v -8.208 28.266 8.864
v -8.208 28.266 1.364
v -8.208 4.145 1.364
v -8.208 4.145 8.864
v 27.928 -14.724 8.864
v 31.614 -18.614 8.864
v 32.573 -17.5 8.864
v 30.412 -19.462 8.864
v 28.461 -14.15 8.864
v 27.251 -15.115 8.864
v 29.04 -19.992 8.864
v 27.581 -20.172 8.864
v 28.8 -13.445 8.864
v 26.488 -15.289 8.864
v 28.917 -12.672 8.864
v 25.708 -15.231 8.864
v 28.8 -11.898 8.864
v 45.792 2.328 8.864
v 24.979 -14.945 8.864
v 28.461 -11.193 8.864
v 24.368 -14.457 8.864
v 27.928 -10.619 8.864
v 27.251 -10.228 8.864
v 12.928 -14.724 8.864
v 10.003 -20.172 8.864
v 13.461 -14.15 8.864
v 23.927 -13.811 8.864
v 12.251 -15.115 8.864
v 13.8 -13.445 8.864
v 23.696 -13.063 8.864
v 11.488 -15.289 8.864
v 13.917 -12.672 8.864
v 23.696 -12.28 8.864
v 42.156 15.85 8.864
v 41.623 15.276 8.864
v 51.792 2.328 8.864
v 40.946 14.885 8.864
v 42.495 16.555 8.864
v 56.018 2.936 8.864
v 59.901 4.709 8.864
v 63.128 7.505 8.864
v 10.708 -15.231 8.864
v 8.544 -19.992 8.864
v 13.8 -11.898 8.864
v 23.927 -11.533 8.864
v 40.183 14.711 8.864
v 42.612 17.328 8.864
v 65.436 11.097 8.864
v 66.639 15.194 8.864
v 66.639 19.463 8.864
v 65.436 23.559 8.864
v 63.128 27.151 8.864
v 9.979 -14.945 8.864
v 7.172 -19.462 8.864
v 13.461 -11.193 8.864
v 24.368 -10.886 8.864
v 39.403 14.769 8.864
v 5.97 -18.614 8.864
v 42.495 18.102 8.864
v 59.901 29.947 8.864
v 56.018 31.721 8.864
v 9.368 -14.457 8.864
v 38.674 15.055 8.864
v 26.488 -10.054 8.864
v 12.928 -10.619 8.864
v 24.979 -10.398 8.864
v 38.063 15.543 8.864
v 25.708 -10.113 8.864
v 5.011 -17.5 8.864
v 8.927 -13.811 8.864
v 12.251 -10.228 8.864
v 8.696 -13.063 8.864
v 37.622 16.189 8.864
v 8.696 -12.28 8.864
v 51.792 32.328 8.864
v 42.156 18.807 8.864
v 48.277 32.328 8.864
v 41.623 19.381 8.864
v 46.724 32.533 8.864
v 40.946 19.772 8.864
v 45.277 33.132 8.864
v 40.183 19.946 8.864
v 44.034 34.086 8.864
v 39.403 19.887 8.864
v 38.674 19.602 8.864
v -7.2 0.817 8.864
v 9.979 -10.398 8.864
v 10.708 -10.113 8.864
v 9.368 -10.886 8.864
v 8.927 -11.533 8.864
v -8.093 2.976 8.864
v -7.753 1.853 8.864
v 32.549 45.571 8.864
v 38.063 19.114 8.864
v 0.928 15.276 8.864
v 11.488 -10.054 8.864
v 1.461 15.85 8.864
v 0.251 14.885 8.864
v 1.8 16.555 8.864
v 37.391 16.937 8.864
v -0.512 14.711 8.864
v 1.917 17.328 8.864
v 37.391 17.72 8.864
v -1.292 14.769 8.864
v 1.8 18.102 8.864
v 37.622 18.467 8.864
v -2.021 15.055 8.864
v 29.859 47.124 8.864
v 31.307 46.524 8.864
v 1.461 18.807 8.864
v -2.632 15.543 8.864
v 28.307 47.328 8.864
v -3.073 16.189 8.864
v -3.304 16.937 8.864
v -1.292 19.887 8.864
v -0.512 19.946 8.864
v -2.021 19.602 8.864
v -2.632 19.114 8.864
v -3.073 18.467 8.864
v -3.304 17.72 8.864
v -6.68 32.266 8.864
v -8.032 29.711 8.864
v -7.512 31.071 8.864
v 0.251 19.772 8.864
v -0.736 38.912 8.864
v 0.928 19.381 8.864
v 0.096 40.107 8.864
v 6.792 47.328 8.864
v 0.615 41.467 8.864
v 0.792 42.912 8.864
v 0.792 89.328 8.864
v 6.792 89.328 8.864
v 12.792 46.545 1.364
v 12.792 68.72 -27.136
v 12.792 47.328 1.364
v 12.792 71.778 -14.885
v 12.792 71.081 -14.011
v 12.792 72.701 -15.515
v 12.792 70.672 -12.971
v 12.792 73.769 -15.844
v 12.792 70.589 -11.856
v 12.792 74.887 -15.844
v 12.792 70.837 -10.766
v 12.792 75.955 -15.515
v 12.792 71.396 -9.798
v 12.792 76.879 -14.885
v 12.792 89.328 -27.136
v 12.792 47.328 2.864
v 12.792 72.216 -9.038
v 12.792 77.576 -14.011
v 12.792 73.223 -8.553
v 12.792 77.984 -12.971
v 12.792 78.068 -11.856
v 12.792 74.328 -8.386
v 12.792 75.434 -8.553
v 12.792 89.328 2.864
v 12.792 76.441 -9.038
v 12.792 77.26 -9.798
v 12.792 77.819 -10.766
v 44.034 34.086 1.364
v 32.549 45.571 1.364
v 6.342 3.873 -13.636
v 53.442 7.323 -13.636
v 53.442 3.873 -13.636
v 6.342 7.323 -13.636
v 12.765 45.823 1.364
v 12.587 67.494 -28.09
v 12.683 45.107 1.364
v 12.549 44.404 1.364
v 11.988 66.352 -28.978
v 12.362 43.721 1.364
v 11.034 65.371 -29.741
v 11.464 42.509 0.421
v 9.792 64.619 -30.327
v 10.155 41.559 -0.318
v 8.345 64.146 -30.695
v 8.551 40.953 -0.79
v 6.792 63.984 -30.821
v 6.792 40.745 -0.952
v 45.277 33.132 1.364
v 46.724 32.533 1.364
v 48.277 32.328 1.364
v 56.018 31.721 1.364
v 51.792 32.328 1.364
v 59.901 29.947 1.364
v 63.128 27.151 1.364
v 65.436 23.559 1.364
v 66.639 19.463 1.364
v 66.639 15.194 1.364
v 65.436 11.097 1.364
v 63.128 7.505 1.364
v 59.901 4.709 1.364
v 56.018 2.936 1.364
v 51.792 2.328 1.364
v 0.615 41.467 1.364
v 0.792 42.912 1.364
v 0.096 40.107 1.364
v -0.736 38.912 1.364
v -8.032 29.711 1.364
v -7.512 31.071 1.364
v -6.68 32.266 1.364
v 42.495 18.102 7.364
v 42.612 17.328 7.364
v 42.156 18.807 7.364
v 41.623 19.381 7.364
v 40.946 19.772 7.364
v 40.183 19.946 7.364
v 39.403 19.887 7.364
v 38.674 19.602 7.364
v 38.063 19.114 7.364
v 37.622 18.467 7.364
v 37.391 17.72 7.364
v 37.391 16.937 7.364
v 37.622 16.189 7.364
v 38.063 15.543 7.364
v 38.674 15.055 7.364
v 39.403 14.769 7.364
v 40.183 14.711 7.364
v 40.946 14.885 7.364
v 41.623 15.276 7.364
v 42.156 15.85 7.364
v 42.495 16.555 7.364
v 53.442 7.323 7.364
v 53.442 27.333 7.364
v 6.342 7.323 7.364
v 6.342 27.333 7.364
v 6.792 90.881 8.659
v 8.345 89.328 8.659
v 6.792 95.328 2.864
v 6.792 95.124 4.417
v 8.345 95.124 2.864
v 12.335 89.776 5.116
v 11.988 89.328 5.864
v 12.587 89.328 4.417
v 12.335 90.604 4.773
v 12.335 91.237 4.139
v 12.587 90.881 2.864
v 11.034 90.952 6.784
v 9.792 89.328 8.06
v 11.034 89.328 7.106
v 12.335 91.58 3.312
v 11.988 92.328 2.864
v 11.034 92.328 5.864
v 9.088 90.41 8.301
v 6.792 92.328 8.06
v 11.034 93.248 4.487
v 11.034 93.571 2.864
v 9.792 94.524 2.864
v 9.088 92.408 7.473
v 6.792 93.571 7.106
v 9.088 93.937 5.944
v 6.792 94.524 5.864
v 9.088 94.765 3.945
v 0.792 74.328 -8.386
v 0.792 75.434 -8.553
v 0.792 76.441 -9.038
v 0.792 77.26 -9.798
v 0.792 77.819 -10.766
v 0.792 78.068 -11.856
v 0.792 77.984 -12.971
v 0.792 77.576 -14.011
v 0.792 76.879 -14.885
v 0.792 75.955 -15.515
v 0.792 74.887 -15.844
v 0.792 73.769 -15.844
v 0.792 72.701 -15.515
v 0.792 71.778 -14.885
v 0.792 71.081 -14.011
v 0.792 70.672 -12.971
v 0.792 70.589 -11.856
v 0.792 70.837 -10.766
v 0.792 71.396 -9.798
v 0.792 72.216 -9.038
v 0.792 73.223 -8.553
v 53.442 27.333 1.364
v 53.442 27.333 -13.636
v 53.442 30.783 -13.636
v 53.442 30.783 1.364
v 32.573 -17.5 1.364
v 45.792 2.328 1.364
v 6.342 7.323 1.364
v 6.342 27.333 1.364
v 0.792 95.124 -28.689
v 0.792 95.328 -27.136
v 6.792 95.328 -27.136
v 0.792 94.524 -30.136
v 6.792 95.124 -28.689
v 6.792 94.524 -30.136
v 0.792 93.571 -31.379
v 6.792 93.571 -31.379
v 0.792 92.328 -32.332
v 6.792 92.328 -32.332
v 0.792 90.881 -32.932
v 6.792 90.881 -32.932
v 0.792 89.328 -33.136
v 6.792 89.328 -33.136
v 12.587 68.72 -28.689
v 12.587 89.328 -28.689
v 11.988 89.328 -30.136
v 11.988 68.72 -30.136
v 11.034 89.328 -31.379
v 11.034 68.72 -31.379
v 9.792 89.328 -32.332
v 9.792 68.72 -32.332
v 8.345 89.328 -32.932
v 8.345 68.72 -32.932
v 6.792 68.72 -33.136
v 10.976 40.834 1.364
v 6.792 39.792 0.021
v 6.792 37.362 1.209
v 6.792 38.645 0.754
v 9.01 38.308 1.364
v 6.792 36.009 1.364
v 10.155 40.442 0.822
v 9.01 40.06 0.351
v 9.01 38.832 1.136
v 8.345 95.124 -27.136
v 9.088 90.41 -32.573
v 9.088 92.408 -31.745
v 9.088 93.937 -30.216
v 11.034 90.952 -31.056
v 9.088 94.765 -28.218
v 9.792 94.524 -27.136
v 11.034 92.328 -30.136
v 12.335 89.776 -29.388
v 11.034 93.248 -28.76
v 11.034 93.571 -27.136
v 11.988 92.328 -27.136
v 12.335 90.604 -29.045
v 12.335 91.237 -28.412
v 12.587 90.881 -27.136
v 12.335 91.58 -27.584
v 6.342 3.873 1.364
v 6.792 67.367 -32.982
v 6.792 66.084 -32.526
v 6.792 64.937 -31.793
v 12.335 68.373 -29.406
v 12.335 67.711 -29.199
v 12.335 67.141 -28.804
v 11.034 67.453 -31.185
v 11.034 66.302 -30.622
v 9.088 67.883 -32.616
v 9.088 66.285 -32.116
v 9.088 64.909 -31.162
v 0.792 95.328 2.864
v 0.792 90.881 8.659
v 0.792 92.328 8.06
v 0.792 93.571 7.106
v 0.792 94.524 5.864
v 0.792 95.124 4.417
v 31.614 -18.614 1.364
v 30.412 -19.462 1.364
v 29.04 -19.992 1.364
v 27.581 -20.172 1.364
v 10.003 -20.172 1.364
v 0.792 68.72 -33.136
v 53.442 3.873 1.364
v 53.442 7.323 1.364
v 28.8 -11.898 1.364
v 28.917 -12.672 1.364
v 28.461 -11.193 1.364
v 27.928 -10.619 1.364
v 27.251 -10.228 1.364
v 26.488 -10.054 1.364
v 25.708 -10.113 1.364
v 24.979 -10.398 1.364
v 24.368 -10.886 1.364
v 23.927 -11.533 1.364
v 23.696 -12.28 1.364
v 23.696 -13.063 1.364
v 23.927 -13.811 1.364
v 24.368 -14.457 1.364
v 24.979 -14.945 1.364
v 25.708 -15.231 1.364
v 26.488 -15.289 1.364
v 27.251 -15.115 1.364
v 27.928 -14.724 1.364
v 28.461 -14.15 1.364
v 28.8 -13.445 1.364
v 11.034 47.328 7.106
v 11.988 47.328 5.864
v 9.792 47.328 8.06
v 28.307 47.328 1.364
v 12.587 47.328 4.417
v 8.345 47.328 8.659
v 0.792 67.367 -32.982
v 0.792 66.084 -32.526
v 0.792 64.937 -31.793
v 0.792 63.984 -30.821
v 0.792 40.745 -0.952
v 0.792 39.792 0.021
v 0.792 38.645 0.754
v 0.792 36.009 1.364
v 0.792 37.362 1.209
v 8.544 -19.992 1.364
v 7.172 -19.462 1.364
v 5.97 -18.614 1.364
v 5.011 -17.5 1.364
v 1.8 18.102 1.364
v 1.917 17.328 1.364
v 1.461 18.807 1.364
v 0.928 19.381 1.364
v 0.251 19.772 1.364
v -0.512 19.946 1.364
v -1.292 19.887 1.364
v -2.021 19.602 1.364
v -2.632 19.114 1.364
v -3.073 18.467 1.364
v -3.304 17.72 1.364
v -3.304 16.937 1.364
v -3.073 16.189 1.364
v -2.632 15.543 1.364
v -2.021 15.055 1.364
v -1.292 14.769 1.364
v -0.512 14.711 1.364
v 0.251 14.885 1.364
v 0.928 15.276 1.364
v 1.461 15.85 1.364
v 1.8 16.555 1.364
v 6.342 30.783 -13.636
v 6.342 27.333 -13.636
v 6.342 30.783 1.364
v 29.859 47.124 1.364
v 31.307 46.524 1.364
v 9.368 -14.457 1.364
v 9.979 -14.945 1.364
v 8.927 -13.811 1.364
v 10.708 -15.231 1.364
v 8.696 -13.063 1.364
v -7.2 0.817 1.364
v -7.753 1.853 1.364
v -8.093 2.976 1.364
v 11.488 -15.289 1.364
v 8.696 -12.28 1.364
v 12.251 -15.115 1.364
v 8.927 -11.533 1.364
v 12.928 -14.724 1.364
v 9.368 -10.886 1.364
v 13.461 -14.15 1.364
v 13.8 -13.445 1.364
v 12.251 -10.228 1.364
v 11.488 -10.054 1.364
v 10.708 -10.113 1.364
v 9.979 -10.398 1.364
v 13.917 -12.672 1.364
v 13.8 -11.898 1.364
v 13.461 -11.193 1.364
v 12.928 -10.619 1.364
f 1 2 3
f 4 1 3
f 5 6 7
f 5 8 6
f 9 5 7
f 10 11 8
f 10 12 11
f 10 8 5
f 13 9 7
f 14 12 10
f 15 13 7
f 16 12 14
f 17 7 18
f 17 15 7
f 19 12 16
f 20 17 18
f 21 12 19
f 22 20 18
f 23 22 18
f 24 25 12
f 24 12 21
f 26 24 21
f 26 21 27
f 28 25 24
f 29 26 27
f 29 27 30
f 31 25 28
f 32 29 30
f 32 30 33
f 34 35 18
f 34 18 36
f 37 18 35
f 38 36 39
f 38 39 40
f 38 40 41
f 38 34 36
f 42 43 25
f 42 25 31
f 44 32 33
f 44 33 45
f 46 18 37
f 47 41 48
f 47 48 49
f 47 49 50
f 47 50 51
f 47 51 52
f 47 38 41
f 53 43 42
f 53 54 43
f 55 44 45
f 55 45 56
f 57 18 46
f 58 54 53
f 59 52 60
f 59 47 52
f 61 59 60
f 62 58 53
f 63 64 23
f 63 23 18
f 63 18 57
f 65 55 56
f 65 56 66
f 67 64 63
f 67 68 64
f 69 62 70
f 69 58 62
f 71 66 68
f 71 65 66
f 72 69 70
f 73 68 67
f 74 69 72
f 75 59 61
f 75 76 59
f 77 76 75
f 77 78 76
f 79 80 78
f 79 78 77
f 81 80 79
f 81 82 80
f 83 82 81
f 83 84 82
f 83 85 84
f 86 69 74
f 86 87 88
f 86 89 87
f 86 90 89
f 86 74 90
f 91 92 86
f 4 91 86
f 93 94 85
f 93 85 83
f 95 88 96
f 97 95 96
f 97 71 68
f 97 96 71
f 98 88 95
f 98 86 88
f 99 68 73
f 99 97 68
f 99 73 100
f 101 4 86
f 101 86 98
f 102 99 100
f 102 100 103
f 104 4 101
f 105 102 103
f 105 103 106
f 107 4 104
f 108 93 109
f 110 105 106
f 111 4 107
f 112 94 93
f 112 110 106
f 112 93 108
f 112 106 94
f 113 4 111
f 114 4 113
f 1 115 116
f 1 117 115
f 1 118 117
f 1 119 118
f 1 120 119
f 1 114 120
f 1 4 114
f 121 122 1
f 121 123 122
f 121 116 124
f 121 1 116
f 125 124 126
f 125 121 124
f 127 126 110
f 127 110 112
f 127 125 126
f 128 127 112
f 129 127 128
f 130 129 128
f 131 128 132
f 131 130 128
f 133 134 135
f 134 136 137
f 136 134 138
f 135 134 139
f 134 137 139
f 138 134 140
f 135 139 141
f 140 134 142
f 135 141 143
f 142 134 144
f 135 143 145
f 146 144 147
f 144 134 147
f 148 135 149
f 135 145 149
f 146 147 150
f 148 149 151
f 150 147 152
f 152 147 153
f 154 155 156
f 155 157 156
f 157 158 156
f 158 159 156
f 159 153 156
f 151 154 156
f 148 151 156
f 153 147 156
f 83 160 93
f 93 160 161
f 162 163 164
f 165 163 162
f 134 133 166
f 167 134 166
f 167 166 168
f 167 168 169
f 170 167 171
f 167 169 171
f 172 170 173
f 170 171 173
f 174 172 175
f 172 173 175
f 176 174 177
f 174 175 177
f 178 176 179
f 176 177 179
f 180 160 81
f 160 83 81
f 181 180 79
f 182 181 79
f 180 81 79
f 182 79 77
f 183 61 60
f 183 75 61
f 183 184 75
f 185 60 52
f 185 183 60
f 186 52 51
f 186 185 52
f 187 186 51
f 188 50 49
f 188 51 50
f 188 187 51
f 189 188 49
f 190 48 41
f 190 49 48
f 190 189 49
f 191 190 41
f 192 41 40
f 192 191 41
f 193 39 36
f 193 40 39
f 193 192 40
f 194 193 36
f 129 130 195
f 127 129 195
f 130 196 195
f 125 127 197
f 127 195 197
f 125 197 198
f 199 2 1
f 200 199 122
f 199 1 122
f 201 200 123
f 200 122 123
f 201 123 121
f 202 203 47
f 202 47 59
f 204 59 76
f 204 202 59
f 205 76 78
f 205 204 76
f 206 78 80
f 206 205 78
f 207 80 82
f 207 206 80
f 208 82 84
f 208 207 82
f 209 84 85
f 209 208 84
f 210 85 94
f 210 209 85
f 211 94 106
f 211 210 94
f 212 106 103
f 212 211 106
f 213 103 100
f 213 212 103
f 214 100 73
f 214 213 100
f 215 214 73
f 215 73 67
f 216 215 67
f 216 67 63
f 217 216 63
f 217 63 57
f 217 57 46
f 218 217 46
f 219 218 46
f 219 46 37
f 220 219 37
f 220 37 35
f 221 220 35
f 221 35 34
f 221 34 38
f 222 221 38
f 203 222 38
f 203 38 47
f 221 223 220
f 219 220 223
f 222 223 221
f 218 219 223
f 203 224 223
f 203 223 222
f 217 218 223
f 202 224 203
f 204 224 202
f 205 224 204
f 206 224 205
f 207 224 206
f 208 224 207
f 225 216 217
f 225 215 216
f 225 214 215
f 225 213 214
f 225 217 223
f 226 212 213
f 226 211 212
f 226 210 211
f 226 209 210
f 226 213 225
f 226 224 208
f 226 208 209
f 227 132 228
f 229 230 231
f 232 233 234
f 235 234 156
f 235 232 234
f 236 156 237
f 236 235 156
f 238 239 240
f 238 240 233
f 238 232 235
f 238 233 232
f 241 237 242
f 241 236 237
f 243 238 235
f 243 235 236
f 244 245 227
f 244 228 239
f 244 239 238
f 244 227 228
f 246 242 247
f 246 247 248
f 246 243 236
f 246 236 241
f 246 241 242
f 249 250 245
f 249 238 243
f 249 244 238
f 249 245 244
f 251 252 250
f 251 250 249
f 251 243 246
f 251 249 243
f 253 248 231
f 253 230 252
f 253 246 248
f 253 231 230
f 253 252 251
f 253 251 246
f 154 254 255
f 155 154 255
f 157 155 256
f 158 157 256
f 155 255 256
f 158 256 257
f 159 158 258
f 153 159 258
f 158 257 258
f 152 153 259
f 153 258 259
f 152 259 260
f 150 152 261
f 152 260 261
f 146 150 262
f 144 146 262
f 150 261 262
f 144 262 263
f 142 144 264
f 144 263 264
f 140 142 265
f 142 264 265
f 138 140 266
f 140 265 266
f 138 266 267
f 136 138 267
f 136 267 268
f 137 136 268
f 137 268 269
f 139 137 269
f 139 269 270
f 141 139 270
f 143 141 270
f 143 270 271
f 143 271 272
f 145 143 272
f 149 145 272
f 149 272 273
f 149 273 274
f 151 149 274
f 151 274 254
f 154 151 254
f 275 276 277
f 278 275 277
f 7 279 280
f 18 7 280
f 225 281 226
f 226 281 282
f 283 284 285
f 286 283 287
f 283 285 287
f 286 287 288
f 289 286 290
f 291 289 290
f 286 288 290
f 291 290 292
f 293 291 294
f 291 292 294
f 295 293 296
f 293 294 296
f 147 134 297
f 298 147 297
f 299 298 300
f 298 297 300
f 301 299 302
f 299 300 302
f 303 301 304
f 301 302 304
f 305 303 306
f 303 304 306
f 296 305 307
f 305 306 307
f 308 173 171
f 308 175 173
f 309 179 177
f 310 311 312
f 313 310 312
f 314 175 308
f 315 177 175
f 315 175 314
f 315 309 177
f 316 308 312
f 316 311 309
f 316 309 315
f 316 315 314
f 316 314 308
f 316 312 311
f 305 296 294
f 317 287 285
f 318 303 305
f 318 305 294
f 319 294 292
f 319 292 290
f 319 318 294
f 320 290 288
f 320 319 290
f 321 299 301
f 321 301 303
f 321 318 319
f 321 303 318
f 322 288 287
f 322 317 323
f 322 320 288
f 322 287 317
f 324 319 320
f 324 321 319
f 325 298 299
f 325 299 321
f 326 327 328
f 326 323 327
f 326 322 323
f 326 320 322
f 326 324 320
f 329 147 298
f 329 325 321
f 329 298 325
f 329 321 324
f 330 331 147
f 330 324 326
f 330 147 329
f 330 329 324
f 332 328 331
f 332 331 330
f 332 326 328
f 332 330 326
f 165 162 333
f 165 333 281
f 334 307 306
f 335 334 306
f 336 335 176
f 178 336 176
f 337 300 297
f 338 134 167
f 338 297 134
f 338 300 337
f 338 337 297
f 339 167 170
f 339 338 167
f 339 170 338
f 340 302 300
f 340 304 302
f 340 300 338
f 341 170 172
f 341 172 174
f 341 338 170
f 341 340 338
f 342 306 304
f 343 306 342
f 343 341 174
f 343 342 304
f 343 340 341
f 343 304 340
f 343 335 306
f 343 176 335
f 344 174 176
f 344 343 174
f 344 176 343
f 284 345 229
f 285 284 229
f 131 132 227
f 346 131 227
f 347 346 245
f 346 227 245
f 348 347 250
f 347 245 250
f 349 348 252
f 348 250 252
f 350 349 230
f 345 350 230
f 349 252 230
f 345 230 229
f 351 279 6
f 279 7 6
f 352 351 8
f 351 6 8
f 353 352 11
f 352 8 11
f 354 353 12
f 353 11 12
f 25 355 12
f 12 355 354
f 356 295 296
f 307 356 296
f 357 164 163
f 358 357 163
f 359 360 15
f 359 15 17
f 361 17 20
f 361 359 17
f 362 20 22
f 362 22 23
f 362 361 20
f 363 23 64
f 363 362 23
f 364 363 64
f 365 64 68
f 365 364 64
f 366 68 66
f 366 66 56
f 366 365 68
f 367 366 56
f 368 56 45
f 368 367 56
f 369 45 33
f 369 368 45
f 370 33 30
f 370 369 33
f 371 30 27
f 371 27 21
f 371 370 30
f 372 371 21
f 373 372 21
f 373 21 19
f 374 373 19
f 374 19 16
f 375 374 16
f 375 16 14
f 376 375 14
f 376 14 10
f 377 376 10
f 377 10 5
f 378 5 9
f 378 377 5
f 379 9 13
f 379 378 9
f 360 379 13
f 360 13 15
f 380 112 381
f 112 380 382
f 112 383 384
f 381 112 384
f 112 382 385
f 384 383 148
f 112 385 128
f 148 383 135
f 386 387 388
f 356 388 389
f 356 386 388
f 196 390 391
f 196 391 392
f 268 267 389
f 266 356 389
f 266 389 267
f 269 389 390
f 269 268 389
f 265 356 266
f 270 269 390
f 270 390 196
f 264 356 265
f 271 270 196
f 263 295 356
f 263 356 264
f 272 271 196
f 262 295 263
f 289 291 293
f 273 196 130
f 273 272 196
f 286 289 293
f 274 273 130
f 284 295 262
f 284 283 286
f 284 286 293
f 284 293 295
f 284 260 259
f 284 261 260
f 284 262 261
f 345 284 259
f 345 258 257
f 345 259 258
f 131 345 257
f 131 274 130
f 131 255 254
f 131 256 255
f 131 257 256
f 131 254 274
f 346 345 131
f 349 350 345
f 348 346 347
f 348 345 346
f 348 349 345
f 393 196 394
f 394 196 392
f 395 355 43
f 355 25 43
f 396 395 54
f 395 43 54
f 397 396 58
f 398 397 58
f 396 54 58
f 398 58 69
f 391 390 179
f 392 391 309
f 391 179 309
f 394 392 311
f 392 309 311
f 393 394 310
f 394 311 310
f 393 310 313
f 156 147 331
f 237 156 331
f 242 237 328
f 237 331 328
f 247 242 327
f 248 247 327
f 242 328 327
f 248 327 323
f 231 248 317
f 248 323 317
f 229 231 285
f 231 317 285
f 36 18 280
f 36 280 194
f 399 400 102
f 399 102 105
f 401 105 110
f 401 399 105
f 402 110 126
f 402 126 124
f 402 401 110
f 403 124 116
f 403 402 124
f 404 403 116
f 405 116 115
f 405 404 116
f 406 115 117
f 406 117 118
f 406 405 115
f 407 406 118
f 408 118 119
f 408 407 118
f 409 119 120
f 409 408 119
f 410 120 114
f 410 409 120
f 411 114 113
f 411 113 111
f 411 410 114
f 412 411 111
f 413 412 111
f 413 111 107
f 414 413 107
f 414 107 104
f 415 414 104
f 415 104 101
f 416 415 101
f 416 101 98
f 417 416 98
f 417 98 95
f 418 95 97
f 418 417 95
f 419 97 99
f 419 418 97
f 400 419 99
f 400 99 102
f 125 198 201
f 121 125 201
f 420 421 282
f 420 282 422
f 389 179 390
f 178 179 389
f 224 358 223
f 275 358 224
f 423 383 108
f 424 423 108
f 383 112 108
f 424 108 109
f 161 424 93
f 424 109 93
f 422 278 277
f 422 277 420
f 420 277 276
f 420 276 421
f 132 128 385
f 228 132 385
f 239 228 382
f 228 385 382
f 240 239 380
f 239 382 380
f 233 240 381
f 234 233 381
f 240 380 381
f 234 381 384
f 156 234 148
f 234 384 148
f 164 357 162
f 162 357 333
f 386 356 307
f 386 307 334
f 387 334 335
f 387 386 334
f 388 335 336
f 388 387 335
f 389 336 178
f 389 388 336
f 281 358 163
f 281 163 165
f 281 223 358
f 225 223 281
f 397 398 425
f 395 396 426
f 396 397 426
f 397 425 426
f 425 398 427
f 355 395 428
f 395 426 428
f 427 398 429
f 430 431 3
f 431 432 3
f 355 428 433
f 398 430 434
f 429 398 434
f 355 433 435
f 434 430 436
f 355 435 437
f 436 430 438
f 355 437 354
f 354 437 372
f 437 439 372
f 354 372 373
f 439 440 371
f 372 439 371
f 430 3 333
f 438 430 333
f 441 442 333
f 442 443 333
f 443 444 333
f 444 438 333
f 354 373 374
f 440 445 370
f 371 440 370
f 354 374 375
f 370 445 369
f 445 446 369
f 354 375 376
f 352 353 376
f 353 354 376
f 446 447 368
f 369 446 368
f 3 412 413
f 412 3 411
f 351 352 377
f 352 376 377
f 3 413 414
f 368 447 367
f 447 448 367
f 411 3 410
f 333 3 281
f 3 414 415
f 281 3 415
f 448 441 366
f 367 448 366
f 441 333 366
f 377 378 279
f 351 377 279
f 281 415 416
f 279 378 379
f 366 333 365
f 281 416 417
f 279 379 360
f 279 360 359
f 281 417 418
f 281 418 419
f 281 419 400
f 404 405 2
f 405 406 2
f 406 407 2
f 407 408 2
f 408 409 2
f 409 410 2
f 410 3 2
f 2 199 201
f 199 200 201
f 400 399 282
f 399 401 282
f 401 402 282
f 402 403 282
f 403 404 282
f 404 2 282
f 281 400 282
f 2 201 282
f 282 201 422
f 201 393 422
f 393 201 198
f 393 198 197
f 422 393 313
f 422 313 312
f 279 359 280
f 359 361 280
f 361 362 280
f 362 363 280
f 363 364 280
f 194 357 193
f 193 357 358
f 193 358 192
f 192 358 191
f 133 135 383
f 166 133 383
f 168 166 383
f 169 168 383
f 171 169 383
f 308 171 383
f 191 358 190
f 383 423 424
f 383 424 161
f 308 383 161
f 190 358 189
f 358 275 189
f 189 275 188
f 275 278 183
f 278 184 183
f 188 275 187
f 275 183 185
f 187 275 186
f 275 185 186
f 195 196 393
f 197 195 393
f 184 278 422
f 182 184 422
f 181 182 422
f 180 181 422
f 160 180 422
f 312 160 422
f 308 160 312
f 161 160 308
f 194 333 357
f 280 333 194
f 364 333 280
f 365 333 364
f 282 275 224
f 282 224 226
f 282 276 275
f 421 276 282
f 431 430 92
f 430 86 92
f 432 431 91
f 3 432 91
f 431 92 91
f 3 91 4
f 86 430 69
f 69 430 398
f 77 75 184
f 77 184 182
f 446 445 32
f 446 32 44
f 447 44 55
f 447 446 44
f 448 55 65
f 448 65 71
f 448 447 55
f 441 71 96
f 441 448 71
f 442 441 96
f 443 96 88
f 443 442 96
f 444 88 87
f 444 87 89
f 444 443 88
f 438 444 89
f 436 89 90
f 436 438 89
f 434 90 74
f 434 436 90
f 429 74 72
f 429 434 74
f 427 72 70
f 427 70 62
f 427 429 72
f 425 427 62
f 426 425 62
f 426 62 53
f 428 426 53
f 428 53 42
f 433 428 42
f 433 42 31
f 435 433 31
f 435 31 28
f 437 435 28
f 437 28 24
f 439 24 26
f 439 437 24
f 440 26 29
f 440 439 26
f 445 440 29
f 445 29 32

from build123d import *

# Parameters (mm, degrees)
SKETCH2_R           = 1.7500000000000018
SKETCH2_R_2         = 1.7499999999999967
SKETCH2_R_3         = 1.7500000000000013
SKETCH2_R_4         = 1.7500000000000038
BOSS_EXTRUDE2_DEPTH = 5
SKETCH5_W           = 31.39999999999999
SKETCH5_H           = 2.3000000000000007
BOSS_EXTRUDE4_DEPTH = 10
CUT_EXTRUDE1_DEPTH  = 77.48529270389177
FILLET1_RADIUS      = 10
FILLET1_LENGTH      = 5
SKETCH7_W           = 31.39999999999999
SKETCH7_H           = 13.340000000000003
CUT_EXTRUDE3_DEPTH  = 4
SKETCH8_W           = 8
SKETCH8_H           = 28
BOSS_EXTRUDE5_DEPTH = 32
BOSS_EXTRUDE6_DEPTH = 8
SKETCH10_R          = 2.500000000000001
CUT_EXTRUDE4_DEPTH  = 92.61877536837086
CUT_EXTRUDE5_DEPTH  = 89.05679985100527
FILLET3_R           = 4
FILLET2_R           = 4
FILLET4_R           = 4
SCALE1_SCALE        = 1.5


with BuildPart() as part:
    # Sketch2 → Boss-Extrude2 (new body)
    with BuildSketch(Plane.XY):
        Polygon((25.999999999999996, 45), (9.999999999999998, 45), (0, 33.819660112501055), (0, 15.000000000000002), (10.000000000000002, 0), (26, 0), (36.00000000000001, 14.999999999999993), (60, 14.999999999999996), (60, 35), (36.00000000000001, 35), align=None)
        with Locations((12.999999999999998, 5.000000000000004)):
            Circle(SKETCH2_R, mode=Mode.SUBTRACT)
        with Locations((22.999999999999993, 5.000000000000004)):
            Circle(SKETCH2_R_2, mode=Mode.SUBTRACT)
        with Locations((5.000000000000001, 24.999999999999993)):
            Circle(SKETCH2_R_3, mode=Mode.SUBTRACT)
        with Locations((32.129999999999995, 24.999999999999993)):
            Circle(SKETCH2_R_4, mode=Mode.SUBTRACT)
    extrude(amount=BOSS_EXTRUDE2_DEPTH)

    # Sketch5 → Boss-Extrude4 (add)
    with BuildSketch(Plane(origin=(0, 0, 0), x_dir=(-1, 0, 0), z_dir=(0, 0, -1))):
        with Locations((-25.4, 17.179999999999993)):
            Rectangle(SKETCH5_W, SKETCH5_H)
        with Locations((-25.4, 32.82)):
            Rectangle(SKETCH5_W, SKETCH5_H)
    extrude(amount=BOSS_EXTRUDE4_DEPTH)

    # Sketch6 → Cut-Extrude1 (cut, through all)
    with BuildSketch(Plane.XY.offset(5)):
        Polygon((60, 35), (49.999999999999986, 35), (49.99999999999999, 14.999999999999993), (60, 14.999999999999993), align=None)
    extrude(amount=-CUT_EXTRUDE1_DEPTH, mode=Mode.SUBTRACT)

    # Fillet1: full round fillet: the end face becomes a half cylinder, R = half its width
    fillet1_face = Plane((50, 25, 2.5), x_dir=(0, 0, -1), z_dir=(1, 0, 0))  # on the end face: x along it, z out of the body
    fillet1_slab = fillet1_face.offset(-FILLET1_RADIUS / 2) * Box(FILLET1_LENGTH, 2 * FILLET1_RADIUS, FILLET1_RADIUS, mode=Mode.PRIVATE)  # the body's end, R deep
    fillet1_round = Plane((40, 25, 2.5), x_dir=(1, 0, 0), z_dir=(0, 0, -1)) * Cylinder(FILLET1_RADIUS, FILLET1_LENGTH, mode=Mode.PRIVATE)  # its axis R under the face
    add(fillet1_slab - fillet1_round, mode=Mode.SUBTRACT)

    # Sketch7 → Cut-Extrude3 (cut)
    with BuildSketch(Plane(origin=(0, 0, 0), x_dir=(-1, 0, 0), z_dir=(0, 0, -1))):
        with Locations((-25.4, 24.999999999999996)):
            Rectangle(SKETCH7_W, SKETCH7_H)
    extrude(amount=-CUT_EXTRUDE3_DEPTH, mode=Mode.SUBTRACT)

    # Sketch8 → Boss-Extrude5 (add)
    with BuildSketch(Plane(origin=(0, 45, 0), x_dir=(1, 0, 0), z_dir=(0, 1, 0))):
        with Locations((9.999999999999996, 9)):
            Rectangle(SKETCH8_W, SKETCH8_H)
    extrude(amount=BOSS_EXTRUDE5_DEPTH)

    # Sketch9 → Boss-Extrude6 (add)
    with BuildSketch(Plane.ZY.offset(-5.999999999999995)):
        Polygon((5.000000000000001, 45), (-23, 45), (-15.299548194431079, 39.40983005625053), (5, 39.40983005625053), align=None)
    extrude(amount=-BOSS_EXTRUDE6_DEPTH)

    # Sketch10 → Cut-Extrude4 (cut, through all)
    with BuildSketch(Plane.ZY.offset(-5.999999999999995)):
        with Locations((-9, 63)):
            Circle(SKETCH10_R)
    extrude(amount=-CUT_EXTRUDE4_DEPTH, mode=Mode.SUBTRACT)

    # Sketch11 → Cut-Extrude5 (cut, through all)
    with BuildSketch(Plane(origin=(13.999999999999995, 0, 0), x_dir=(0, 0, -1), z_dir=(1, 0, 0))):
        Polygon((0, 39.40983005625053), (23, 57.30500139086019), (23, 45), (15.299548194431079, 39.40983005625053), align=None)
    extrude(amount=-CUT_EXTRUDE5_DEPTH, mode=Mode.SUBTRACT)

    # Fillet3
    fillet3_edges = [part.edges().sort_by_distance(p)[0] for p in [
        (9.999999999999995, 77, -23),
        (9.999999999999995, 77, 5.000000000000001),
        (9.999999999999995, 39.40983005625053, 0),
        (9.999999999999995, 57.30500139086019, -23),
    ]]
    fillet(fillet3_edges, radius=FILLET3_R)

    # Fillet2
    # the kernel refuses this fillet: 4 mm, written as the material it takes off along each edge
    with BuildSketch(Plane(origin=(13.999999999999995, 40.61090749308988, -1.5437002826498933), x_dir=(-1, 1.3e-16, 1e-16), z_dir=(0, 0.6140749293375269, -0.7892477311713423))) as fillet2_piece_1_section:
        with BuildLine():
            CenterArc((FILLET2_R, FILLET2_R), FILLET2_R, 180, 90)
            Line((6.8e-16, FILLET2_R), (0, 0))
            Line((0, 0), (FILLET2_R, 0))
        make_face()
    fillet2_piece_1 = extrude(amount=25.229846914032212, mode=Mode.PRIVATE)
    fillet2_piece_1 = split(fillet2_piece_1, bisect_by=Plane(origin=(13.08677452715668, 48.37488686948177, 0), z_dir=(0, 0, -1)), keep=Keep.TOP, mode=Mode.PRIVATE)
    add(fillet2_piece_1, mode=Mode.SUBTRACT)
    with BuildSketch(Plane(origin=(13.999999999999995, 59.26091487870621, -23), x_dir=(-1, 0, 0), z_dir=(0, 1, 0))) as fillet2_piece_2:
        with BuildLine():
            CenterArc((FILLET2_R, FILLET2_R), FILLET2_R, 180, 90)
            Line((0, FILLET2_R), (0, 0))
            Line((0, 0), (FILLET2_R, 0))
        make_face()
    extrude(amount=13.73908512129379, mode=Mode.SUBTRACT)
    with BuildSketch(Plane(origin=(13.999999999999995, 77, -19), x_dir=(-1, 0, 0), z_dir=(0, 0, 1))) as fillet2_piece_3:
        with BuildLine():
            CenterArc((FILLET2_R, FILLET2_R), FILLET2_R, 180, 90)
            Line((0, FILLET2_R), (0, 0))
            Line((0, 0), (FILLET2_R, 0))
        make_face()
    extrude(amount=20, mode=Mode.SUBTRACT)
    with BuildSketch(Plane(origin=(13.999999999999995, 45, 5.000000000000001), x_dir=(-1, 0, -2.2e-16), z_dir=(0, 1, 0))) as fillet2_piece_4:
        with BuildLine():
            CenterArc((FILLET2_R, -FILLET2_R), FILLET2_R, 90.00000000000001, 89.99999999999999)
            Line((2.66e-15, -FILLET2_R), (0, 0))
            Line((0, 0), (FILLET2_R, 0))
        make_face()
    extrude(amount=28, mode=Mode.SUBTRACT)
    with BuildSketch(Plane(origin=(13.999999999999995, 73, 1.0000000000000009), x_dir=(0, 0, 1), z_dir=(0, -1, 0))) as fillet2_piece_5:
        with BuildLine():
            CenterArc((4 - FILLET2_R, FILLET2_R), FILLET2_R, 270, 90)
            Line((4 - FILLET2_R, 0), (4, 0))
            Line((4, 0), (4, FILLET2_R))
        make_face()
    revolve(axis=Axis((13.999999999999995, 73, 1.0000000000000009), (-1, 0, 0)), revolution_arc=90, mode=Mode.SUBTRACT)
    with BuildSketch(Plane(origin=(13.999999999999995, 73, -19), x_dir=(0, 0, -1), z_dir=(0, -1, 0))) as fillet2_piece_6:
        with BuildLine():
            CenterArc((4 - FILLET2_R, -FILLET2_R), FILLET2_R, 0, 90)
            Line((4 - FILLET2_R, 0), (4, 0))
            Line((4, 0), (4, -FILLET2_R))
        make_face()
    revolve(axis=Axis((13.999999999999995, 73, -19), (1, 0, 0)), revolution_arc=90, mode=Mode.SUBTRACT)
    with BuildSketch(Plane(origin=(13.999999999999995, 59.26091487870621, -19), x_dir=(0, 0, -1), z_dir=(0, 1, 0))) as fillet2_piece_7:
        with BuildLine():
            CenterArc((4 - FILLET2_R, FILLET2_R), FILLET2_R, 270, 90)
            Line((4 - FILLET2_R, 0), (4, 0))
            Line((4, 0), (4, FILLET2_R))
        make_face()
    revolve(axis=Axis((13.999999999999995, 59.26091487870621, -19), (-1, 0, 0)), revolution_arc=52.11526627923318, mode=Mode.SUBTRACT)
    with BuildSketch(Plane(origin=(13.999999999999995, 37.453916568404516, -4.000000000000001), x_dir=(0, 0.7892477311713422, 0.614074929337527), z_dir=(0, 0.614074929337527, -0.7892477311713422))) as fillet2_piece_8_section:
        with BuildLine():
            CenterArc((3.999999999999998 + FILLET2_R, -FILLET2_R), FILLET2_R, 90.00000000000004, 89.99999999999994)
            Line((3.999999999999998 + FILLET2_R, 0), (3.999999999999998, 0))
            Line((3.999999999999998, 0), (4, -FILLET2_R))
        make_face()
    fillet2_piece_8 = revolve(axis=Axis((13.999999999999995, 37.453916568404516, -4.000000000000001), (1, 0, 0)), revolution_arc=195.37400527524528, mode=Mode.PRIVATE)
    fillet2_piece_8 = split(fillet2_piece_8, bisect_by=Plane(origin=(12.442859007716585, 39.2454758765285, 0), z_dir=(0, 0, -1)), keep=Keep.TOP, mode=Mode.PRIVATE)
    fillet2_piece_8 = split(fillet2_piece_8, bisect_by=Plane(origin=(12.442859007716585, 33.97, -0.3361174942439581), z_dir=(0, 1, 0)), keep=Keep.TOP, mode=Mode.PRIVATE)
    add(fillet2_piece_8, mode=Mode.SUBTRACT)

    # Fillet4
    fillet4_edges = [part.edges().sort_by_distance(p)[0] for p in [
        (5.999999999999995, 40.52786404500041, 2.500000000000001),
        (26, 0, 2.5),
        (10.000000000000002, 0, 2.5),
        (0, 15.000000000000002, 2.5),
        (0, 33.819660112501055, 2.5),
        (25.999999999999996, 45, 2.5),
        (36.00000000000001, 35, 2.5),
    ]]
    fillet(fillet4_edges, radius=FILLET4_R)


with BuildPart() as part_1:
    # Scale1: scaled about (16.416357699, 40.343462641, -2.727678487)
    add(part.part.scale(SCALE1_SCALE).moved(Location((-8.2081788495, -20.1717313205, 1.3638392435))))


solid = part_1.part
